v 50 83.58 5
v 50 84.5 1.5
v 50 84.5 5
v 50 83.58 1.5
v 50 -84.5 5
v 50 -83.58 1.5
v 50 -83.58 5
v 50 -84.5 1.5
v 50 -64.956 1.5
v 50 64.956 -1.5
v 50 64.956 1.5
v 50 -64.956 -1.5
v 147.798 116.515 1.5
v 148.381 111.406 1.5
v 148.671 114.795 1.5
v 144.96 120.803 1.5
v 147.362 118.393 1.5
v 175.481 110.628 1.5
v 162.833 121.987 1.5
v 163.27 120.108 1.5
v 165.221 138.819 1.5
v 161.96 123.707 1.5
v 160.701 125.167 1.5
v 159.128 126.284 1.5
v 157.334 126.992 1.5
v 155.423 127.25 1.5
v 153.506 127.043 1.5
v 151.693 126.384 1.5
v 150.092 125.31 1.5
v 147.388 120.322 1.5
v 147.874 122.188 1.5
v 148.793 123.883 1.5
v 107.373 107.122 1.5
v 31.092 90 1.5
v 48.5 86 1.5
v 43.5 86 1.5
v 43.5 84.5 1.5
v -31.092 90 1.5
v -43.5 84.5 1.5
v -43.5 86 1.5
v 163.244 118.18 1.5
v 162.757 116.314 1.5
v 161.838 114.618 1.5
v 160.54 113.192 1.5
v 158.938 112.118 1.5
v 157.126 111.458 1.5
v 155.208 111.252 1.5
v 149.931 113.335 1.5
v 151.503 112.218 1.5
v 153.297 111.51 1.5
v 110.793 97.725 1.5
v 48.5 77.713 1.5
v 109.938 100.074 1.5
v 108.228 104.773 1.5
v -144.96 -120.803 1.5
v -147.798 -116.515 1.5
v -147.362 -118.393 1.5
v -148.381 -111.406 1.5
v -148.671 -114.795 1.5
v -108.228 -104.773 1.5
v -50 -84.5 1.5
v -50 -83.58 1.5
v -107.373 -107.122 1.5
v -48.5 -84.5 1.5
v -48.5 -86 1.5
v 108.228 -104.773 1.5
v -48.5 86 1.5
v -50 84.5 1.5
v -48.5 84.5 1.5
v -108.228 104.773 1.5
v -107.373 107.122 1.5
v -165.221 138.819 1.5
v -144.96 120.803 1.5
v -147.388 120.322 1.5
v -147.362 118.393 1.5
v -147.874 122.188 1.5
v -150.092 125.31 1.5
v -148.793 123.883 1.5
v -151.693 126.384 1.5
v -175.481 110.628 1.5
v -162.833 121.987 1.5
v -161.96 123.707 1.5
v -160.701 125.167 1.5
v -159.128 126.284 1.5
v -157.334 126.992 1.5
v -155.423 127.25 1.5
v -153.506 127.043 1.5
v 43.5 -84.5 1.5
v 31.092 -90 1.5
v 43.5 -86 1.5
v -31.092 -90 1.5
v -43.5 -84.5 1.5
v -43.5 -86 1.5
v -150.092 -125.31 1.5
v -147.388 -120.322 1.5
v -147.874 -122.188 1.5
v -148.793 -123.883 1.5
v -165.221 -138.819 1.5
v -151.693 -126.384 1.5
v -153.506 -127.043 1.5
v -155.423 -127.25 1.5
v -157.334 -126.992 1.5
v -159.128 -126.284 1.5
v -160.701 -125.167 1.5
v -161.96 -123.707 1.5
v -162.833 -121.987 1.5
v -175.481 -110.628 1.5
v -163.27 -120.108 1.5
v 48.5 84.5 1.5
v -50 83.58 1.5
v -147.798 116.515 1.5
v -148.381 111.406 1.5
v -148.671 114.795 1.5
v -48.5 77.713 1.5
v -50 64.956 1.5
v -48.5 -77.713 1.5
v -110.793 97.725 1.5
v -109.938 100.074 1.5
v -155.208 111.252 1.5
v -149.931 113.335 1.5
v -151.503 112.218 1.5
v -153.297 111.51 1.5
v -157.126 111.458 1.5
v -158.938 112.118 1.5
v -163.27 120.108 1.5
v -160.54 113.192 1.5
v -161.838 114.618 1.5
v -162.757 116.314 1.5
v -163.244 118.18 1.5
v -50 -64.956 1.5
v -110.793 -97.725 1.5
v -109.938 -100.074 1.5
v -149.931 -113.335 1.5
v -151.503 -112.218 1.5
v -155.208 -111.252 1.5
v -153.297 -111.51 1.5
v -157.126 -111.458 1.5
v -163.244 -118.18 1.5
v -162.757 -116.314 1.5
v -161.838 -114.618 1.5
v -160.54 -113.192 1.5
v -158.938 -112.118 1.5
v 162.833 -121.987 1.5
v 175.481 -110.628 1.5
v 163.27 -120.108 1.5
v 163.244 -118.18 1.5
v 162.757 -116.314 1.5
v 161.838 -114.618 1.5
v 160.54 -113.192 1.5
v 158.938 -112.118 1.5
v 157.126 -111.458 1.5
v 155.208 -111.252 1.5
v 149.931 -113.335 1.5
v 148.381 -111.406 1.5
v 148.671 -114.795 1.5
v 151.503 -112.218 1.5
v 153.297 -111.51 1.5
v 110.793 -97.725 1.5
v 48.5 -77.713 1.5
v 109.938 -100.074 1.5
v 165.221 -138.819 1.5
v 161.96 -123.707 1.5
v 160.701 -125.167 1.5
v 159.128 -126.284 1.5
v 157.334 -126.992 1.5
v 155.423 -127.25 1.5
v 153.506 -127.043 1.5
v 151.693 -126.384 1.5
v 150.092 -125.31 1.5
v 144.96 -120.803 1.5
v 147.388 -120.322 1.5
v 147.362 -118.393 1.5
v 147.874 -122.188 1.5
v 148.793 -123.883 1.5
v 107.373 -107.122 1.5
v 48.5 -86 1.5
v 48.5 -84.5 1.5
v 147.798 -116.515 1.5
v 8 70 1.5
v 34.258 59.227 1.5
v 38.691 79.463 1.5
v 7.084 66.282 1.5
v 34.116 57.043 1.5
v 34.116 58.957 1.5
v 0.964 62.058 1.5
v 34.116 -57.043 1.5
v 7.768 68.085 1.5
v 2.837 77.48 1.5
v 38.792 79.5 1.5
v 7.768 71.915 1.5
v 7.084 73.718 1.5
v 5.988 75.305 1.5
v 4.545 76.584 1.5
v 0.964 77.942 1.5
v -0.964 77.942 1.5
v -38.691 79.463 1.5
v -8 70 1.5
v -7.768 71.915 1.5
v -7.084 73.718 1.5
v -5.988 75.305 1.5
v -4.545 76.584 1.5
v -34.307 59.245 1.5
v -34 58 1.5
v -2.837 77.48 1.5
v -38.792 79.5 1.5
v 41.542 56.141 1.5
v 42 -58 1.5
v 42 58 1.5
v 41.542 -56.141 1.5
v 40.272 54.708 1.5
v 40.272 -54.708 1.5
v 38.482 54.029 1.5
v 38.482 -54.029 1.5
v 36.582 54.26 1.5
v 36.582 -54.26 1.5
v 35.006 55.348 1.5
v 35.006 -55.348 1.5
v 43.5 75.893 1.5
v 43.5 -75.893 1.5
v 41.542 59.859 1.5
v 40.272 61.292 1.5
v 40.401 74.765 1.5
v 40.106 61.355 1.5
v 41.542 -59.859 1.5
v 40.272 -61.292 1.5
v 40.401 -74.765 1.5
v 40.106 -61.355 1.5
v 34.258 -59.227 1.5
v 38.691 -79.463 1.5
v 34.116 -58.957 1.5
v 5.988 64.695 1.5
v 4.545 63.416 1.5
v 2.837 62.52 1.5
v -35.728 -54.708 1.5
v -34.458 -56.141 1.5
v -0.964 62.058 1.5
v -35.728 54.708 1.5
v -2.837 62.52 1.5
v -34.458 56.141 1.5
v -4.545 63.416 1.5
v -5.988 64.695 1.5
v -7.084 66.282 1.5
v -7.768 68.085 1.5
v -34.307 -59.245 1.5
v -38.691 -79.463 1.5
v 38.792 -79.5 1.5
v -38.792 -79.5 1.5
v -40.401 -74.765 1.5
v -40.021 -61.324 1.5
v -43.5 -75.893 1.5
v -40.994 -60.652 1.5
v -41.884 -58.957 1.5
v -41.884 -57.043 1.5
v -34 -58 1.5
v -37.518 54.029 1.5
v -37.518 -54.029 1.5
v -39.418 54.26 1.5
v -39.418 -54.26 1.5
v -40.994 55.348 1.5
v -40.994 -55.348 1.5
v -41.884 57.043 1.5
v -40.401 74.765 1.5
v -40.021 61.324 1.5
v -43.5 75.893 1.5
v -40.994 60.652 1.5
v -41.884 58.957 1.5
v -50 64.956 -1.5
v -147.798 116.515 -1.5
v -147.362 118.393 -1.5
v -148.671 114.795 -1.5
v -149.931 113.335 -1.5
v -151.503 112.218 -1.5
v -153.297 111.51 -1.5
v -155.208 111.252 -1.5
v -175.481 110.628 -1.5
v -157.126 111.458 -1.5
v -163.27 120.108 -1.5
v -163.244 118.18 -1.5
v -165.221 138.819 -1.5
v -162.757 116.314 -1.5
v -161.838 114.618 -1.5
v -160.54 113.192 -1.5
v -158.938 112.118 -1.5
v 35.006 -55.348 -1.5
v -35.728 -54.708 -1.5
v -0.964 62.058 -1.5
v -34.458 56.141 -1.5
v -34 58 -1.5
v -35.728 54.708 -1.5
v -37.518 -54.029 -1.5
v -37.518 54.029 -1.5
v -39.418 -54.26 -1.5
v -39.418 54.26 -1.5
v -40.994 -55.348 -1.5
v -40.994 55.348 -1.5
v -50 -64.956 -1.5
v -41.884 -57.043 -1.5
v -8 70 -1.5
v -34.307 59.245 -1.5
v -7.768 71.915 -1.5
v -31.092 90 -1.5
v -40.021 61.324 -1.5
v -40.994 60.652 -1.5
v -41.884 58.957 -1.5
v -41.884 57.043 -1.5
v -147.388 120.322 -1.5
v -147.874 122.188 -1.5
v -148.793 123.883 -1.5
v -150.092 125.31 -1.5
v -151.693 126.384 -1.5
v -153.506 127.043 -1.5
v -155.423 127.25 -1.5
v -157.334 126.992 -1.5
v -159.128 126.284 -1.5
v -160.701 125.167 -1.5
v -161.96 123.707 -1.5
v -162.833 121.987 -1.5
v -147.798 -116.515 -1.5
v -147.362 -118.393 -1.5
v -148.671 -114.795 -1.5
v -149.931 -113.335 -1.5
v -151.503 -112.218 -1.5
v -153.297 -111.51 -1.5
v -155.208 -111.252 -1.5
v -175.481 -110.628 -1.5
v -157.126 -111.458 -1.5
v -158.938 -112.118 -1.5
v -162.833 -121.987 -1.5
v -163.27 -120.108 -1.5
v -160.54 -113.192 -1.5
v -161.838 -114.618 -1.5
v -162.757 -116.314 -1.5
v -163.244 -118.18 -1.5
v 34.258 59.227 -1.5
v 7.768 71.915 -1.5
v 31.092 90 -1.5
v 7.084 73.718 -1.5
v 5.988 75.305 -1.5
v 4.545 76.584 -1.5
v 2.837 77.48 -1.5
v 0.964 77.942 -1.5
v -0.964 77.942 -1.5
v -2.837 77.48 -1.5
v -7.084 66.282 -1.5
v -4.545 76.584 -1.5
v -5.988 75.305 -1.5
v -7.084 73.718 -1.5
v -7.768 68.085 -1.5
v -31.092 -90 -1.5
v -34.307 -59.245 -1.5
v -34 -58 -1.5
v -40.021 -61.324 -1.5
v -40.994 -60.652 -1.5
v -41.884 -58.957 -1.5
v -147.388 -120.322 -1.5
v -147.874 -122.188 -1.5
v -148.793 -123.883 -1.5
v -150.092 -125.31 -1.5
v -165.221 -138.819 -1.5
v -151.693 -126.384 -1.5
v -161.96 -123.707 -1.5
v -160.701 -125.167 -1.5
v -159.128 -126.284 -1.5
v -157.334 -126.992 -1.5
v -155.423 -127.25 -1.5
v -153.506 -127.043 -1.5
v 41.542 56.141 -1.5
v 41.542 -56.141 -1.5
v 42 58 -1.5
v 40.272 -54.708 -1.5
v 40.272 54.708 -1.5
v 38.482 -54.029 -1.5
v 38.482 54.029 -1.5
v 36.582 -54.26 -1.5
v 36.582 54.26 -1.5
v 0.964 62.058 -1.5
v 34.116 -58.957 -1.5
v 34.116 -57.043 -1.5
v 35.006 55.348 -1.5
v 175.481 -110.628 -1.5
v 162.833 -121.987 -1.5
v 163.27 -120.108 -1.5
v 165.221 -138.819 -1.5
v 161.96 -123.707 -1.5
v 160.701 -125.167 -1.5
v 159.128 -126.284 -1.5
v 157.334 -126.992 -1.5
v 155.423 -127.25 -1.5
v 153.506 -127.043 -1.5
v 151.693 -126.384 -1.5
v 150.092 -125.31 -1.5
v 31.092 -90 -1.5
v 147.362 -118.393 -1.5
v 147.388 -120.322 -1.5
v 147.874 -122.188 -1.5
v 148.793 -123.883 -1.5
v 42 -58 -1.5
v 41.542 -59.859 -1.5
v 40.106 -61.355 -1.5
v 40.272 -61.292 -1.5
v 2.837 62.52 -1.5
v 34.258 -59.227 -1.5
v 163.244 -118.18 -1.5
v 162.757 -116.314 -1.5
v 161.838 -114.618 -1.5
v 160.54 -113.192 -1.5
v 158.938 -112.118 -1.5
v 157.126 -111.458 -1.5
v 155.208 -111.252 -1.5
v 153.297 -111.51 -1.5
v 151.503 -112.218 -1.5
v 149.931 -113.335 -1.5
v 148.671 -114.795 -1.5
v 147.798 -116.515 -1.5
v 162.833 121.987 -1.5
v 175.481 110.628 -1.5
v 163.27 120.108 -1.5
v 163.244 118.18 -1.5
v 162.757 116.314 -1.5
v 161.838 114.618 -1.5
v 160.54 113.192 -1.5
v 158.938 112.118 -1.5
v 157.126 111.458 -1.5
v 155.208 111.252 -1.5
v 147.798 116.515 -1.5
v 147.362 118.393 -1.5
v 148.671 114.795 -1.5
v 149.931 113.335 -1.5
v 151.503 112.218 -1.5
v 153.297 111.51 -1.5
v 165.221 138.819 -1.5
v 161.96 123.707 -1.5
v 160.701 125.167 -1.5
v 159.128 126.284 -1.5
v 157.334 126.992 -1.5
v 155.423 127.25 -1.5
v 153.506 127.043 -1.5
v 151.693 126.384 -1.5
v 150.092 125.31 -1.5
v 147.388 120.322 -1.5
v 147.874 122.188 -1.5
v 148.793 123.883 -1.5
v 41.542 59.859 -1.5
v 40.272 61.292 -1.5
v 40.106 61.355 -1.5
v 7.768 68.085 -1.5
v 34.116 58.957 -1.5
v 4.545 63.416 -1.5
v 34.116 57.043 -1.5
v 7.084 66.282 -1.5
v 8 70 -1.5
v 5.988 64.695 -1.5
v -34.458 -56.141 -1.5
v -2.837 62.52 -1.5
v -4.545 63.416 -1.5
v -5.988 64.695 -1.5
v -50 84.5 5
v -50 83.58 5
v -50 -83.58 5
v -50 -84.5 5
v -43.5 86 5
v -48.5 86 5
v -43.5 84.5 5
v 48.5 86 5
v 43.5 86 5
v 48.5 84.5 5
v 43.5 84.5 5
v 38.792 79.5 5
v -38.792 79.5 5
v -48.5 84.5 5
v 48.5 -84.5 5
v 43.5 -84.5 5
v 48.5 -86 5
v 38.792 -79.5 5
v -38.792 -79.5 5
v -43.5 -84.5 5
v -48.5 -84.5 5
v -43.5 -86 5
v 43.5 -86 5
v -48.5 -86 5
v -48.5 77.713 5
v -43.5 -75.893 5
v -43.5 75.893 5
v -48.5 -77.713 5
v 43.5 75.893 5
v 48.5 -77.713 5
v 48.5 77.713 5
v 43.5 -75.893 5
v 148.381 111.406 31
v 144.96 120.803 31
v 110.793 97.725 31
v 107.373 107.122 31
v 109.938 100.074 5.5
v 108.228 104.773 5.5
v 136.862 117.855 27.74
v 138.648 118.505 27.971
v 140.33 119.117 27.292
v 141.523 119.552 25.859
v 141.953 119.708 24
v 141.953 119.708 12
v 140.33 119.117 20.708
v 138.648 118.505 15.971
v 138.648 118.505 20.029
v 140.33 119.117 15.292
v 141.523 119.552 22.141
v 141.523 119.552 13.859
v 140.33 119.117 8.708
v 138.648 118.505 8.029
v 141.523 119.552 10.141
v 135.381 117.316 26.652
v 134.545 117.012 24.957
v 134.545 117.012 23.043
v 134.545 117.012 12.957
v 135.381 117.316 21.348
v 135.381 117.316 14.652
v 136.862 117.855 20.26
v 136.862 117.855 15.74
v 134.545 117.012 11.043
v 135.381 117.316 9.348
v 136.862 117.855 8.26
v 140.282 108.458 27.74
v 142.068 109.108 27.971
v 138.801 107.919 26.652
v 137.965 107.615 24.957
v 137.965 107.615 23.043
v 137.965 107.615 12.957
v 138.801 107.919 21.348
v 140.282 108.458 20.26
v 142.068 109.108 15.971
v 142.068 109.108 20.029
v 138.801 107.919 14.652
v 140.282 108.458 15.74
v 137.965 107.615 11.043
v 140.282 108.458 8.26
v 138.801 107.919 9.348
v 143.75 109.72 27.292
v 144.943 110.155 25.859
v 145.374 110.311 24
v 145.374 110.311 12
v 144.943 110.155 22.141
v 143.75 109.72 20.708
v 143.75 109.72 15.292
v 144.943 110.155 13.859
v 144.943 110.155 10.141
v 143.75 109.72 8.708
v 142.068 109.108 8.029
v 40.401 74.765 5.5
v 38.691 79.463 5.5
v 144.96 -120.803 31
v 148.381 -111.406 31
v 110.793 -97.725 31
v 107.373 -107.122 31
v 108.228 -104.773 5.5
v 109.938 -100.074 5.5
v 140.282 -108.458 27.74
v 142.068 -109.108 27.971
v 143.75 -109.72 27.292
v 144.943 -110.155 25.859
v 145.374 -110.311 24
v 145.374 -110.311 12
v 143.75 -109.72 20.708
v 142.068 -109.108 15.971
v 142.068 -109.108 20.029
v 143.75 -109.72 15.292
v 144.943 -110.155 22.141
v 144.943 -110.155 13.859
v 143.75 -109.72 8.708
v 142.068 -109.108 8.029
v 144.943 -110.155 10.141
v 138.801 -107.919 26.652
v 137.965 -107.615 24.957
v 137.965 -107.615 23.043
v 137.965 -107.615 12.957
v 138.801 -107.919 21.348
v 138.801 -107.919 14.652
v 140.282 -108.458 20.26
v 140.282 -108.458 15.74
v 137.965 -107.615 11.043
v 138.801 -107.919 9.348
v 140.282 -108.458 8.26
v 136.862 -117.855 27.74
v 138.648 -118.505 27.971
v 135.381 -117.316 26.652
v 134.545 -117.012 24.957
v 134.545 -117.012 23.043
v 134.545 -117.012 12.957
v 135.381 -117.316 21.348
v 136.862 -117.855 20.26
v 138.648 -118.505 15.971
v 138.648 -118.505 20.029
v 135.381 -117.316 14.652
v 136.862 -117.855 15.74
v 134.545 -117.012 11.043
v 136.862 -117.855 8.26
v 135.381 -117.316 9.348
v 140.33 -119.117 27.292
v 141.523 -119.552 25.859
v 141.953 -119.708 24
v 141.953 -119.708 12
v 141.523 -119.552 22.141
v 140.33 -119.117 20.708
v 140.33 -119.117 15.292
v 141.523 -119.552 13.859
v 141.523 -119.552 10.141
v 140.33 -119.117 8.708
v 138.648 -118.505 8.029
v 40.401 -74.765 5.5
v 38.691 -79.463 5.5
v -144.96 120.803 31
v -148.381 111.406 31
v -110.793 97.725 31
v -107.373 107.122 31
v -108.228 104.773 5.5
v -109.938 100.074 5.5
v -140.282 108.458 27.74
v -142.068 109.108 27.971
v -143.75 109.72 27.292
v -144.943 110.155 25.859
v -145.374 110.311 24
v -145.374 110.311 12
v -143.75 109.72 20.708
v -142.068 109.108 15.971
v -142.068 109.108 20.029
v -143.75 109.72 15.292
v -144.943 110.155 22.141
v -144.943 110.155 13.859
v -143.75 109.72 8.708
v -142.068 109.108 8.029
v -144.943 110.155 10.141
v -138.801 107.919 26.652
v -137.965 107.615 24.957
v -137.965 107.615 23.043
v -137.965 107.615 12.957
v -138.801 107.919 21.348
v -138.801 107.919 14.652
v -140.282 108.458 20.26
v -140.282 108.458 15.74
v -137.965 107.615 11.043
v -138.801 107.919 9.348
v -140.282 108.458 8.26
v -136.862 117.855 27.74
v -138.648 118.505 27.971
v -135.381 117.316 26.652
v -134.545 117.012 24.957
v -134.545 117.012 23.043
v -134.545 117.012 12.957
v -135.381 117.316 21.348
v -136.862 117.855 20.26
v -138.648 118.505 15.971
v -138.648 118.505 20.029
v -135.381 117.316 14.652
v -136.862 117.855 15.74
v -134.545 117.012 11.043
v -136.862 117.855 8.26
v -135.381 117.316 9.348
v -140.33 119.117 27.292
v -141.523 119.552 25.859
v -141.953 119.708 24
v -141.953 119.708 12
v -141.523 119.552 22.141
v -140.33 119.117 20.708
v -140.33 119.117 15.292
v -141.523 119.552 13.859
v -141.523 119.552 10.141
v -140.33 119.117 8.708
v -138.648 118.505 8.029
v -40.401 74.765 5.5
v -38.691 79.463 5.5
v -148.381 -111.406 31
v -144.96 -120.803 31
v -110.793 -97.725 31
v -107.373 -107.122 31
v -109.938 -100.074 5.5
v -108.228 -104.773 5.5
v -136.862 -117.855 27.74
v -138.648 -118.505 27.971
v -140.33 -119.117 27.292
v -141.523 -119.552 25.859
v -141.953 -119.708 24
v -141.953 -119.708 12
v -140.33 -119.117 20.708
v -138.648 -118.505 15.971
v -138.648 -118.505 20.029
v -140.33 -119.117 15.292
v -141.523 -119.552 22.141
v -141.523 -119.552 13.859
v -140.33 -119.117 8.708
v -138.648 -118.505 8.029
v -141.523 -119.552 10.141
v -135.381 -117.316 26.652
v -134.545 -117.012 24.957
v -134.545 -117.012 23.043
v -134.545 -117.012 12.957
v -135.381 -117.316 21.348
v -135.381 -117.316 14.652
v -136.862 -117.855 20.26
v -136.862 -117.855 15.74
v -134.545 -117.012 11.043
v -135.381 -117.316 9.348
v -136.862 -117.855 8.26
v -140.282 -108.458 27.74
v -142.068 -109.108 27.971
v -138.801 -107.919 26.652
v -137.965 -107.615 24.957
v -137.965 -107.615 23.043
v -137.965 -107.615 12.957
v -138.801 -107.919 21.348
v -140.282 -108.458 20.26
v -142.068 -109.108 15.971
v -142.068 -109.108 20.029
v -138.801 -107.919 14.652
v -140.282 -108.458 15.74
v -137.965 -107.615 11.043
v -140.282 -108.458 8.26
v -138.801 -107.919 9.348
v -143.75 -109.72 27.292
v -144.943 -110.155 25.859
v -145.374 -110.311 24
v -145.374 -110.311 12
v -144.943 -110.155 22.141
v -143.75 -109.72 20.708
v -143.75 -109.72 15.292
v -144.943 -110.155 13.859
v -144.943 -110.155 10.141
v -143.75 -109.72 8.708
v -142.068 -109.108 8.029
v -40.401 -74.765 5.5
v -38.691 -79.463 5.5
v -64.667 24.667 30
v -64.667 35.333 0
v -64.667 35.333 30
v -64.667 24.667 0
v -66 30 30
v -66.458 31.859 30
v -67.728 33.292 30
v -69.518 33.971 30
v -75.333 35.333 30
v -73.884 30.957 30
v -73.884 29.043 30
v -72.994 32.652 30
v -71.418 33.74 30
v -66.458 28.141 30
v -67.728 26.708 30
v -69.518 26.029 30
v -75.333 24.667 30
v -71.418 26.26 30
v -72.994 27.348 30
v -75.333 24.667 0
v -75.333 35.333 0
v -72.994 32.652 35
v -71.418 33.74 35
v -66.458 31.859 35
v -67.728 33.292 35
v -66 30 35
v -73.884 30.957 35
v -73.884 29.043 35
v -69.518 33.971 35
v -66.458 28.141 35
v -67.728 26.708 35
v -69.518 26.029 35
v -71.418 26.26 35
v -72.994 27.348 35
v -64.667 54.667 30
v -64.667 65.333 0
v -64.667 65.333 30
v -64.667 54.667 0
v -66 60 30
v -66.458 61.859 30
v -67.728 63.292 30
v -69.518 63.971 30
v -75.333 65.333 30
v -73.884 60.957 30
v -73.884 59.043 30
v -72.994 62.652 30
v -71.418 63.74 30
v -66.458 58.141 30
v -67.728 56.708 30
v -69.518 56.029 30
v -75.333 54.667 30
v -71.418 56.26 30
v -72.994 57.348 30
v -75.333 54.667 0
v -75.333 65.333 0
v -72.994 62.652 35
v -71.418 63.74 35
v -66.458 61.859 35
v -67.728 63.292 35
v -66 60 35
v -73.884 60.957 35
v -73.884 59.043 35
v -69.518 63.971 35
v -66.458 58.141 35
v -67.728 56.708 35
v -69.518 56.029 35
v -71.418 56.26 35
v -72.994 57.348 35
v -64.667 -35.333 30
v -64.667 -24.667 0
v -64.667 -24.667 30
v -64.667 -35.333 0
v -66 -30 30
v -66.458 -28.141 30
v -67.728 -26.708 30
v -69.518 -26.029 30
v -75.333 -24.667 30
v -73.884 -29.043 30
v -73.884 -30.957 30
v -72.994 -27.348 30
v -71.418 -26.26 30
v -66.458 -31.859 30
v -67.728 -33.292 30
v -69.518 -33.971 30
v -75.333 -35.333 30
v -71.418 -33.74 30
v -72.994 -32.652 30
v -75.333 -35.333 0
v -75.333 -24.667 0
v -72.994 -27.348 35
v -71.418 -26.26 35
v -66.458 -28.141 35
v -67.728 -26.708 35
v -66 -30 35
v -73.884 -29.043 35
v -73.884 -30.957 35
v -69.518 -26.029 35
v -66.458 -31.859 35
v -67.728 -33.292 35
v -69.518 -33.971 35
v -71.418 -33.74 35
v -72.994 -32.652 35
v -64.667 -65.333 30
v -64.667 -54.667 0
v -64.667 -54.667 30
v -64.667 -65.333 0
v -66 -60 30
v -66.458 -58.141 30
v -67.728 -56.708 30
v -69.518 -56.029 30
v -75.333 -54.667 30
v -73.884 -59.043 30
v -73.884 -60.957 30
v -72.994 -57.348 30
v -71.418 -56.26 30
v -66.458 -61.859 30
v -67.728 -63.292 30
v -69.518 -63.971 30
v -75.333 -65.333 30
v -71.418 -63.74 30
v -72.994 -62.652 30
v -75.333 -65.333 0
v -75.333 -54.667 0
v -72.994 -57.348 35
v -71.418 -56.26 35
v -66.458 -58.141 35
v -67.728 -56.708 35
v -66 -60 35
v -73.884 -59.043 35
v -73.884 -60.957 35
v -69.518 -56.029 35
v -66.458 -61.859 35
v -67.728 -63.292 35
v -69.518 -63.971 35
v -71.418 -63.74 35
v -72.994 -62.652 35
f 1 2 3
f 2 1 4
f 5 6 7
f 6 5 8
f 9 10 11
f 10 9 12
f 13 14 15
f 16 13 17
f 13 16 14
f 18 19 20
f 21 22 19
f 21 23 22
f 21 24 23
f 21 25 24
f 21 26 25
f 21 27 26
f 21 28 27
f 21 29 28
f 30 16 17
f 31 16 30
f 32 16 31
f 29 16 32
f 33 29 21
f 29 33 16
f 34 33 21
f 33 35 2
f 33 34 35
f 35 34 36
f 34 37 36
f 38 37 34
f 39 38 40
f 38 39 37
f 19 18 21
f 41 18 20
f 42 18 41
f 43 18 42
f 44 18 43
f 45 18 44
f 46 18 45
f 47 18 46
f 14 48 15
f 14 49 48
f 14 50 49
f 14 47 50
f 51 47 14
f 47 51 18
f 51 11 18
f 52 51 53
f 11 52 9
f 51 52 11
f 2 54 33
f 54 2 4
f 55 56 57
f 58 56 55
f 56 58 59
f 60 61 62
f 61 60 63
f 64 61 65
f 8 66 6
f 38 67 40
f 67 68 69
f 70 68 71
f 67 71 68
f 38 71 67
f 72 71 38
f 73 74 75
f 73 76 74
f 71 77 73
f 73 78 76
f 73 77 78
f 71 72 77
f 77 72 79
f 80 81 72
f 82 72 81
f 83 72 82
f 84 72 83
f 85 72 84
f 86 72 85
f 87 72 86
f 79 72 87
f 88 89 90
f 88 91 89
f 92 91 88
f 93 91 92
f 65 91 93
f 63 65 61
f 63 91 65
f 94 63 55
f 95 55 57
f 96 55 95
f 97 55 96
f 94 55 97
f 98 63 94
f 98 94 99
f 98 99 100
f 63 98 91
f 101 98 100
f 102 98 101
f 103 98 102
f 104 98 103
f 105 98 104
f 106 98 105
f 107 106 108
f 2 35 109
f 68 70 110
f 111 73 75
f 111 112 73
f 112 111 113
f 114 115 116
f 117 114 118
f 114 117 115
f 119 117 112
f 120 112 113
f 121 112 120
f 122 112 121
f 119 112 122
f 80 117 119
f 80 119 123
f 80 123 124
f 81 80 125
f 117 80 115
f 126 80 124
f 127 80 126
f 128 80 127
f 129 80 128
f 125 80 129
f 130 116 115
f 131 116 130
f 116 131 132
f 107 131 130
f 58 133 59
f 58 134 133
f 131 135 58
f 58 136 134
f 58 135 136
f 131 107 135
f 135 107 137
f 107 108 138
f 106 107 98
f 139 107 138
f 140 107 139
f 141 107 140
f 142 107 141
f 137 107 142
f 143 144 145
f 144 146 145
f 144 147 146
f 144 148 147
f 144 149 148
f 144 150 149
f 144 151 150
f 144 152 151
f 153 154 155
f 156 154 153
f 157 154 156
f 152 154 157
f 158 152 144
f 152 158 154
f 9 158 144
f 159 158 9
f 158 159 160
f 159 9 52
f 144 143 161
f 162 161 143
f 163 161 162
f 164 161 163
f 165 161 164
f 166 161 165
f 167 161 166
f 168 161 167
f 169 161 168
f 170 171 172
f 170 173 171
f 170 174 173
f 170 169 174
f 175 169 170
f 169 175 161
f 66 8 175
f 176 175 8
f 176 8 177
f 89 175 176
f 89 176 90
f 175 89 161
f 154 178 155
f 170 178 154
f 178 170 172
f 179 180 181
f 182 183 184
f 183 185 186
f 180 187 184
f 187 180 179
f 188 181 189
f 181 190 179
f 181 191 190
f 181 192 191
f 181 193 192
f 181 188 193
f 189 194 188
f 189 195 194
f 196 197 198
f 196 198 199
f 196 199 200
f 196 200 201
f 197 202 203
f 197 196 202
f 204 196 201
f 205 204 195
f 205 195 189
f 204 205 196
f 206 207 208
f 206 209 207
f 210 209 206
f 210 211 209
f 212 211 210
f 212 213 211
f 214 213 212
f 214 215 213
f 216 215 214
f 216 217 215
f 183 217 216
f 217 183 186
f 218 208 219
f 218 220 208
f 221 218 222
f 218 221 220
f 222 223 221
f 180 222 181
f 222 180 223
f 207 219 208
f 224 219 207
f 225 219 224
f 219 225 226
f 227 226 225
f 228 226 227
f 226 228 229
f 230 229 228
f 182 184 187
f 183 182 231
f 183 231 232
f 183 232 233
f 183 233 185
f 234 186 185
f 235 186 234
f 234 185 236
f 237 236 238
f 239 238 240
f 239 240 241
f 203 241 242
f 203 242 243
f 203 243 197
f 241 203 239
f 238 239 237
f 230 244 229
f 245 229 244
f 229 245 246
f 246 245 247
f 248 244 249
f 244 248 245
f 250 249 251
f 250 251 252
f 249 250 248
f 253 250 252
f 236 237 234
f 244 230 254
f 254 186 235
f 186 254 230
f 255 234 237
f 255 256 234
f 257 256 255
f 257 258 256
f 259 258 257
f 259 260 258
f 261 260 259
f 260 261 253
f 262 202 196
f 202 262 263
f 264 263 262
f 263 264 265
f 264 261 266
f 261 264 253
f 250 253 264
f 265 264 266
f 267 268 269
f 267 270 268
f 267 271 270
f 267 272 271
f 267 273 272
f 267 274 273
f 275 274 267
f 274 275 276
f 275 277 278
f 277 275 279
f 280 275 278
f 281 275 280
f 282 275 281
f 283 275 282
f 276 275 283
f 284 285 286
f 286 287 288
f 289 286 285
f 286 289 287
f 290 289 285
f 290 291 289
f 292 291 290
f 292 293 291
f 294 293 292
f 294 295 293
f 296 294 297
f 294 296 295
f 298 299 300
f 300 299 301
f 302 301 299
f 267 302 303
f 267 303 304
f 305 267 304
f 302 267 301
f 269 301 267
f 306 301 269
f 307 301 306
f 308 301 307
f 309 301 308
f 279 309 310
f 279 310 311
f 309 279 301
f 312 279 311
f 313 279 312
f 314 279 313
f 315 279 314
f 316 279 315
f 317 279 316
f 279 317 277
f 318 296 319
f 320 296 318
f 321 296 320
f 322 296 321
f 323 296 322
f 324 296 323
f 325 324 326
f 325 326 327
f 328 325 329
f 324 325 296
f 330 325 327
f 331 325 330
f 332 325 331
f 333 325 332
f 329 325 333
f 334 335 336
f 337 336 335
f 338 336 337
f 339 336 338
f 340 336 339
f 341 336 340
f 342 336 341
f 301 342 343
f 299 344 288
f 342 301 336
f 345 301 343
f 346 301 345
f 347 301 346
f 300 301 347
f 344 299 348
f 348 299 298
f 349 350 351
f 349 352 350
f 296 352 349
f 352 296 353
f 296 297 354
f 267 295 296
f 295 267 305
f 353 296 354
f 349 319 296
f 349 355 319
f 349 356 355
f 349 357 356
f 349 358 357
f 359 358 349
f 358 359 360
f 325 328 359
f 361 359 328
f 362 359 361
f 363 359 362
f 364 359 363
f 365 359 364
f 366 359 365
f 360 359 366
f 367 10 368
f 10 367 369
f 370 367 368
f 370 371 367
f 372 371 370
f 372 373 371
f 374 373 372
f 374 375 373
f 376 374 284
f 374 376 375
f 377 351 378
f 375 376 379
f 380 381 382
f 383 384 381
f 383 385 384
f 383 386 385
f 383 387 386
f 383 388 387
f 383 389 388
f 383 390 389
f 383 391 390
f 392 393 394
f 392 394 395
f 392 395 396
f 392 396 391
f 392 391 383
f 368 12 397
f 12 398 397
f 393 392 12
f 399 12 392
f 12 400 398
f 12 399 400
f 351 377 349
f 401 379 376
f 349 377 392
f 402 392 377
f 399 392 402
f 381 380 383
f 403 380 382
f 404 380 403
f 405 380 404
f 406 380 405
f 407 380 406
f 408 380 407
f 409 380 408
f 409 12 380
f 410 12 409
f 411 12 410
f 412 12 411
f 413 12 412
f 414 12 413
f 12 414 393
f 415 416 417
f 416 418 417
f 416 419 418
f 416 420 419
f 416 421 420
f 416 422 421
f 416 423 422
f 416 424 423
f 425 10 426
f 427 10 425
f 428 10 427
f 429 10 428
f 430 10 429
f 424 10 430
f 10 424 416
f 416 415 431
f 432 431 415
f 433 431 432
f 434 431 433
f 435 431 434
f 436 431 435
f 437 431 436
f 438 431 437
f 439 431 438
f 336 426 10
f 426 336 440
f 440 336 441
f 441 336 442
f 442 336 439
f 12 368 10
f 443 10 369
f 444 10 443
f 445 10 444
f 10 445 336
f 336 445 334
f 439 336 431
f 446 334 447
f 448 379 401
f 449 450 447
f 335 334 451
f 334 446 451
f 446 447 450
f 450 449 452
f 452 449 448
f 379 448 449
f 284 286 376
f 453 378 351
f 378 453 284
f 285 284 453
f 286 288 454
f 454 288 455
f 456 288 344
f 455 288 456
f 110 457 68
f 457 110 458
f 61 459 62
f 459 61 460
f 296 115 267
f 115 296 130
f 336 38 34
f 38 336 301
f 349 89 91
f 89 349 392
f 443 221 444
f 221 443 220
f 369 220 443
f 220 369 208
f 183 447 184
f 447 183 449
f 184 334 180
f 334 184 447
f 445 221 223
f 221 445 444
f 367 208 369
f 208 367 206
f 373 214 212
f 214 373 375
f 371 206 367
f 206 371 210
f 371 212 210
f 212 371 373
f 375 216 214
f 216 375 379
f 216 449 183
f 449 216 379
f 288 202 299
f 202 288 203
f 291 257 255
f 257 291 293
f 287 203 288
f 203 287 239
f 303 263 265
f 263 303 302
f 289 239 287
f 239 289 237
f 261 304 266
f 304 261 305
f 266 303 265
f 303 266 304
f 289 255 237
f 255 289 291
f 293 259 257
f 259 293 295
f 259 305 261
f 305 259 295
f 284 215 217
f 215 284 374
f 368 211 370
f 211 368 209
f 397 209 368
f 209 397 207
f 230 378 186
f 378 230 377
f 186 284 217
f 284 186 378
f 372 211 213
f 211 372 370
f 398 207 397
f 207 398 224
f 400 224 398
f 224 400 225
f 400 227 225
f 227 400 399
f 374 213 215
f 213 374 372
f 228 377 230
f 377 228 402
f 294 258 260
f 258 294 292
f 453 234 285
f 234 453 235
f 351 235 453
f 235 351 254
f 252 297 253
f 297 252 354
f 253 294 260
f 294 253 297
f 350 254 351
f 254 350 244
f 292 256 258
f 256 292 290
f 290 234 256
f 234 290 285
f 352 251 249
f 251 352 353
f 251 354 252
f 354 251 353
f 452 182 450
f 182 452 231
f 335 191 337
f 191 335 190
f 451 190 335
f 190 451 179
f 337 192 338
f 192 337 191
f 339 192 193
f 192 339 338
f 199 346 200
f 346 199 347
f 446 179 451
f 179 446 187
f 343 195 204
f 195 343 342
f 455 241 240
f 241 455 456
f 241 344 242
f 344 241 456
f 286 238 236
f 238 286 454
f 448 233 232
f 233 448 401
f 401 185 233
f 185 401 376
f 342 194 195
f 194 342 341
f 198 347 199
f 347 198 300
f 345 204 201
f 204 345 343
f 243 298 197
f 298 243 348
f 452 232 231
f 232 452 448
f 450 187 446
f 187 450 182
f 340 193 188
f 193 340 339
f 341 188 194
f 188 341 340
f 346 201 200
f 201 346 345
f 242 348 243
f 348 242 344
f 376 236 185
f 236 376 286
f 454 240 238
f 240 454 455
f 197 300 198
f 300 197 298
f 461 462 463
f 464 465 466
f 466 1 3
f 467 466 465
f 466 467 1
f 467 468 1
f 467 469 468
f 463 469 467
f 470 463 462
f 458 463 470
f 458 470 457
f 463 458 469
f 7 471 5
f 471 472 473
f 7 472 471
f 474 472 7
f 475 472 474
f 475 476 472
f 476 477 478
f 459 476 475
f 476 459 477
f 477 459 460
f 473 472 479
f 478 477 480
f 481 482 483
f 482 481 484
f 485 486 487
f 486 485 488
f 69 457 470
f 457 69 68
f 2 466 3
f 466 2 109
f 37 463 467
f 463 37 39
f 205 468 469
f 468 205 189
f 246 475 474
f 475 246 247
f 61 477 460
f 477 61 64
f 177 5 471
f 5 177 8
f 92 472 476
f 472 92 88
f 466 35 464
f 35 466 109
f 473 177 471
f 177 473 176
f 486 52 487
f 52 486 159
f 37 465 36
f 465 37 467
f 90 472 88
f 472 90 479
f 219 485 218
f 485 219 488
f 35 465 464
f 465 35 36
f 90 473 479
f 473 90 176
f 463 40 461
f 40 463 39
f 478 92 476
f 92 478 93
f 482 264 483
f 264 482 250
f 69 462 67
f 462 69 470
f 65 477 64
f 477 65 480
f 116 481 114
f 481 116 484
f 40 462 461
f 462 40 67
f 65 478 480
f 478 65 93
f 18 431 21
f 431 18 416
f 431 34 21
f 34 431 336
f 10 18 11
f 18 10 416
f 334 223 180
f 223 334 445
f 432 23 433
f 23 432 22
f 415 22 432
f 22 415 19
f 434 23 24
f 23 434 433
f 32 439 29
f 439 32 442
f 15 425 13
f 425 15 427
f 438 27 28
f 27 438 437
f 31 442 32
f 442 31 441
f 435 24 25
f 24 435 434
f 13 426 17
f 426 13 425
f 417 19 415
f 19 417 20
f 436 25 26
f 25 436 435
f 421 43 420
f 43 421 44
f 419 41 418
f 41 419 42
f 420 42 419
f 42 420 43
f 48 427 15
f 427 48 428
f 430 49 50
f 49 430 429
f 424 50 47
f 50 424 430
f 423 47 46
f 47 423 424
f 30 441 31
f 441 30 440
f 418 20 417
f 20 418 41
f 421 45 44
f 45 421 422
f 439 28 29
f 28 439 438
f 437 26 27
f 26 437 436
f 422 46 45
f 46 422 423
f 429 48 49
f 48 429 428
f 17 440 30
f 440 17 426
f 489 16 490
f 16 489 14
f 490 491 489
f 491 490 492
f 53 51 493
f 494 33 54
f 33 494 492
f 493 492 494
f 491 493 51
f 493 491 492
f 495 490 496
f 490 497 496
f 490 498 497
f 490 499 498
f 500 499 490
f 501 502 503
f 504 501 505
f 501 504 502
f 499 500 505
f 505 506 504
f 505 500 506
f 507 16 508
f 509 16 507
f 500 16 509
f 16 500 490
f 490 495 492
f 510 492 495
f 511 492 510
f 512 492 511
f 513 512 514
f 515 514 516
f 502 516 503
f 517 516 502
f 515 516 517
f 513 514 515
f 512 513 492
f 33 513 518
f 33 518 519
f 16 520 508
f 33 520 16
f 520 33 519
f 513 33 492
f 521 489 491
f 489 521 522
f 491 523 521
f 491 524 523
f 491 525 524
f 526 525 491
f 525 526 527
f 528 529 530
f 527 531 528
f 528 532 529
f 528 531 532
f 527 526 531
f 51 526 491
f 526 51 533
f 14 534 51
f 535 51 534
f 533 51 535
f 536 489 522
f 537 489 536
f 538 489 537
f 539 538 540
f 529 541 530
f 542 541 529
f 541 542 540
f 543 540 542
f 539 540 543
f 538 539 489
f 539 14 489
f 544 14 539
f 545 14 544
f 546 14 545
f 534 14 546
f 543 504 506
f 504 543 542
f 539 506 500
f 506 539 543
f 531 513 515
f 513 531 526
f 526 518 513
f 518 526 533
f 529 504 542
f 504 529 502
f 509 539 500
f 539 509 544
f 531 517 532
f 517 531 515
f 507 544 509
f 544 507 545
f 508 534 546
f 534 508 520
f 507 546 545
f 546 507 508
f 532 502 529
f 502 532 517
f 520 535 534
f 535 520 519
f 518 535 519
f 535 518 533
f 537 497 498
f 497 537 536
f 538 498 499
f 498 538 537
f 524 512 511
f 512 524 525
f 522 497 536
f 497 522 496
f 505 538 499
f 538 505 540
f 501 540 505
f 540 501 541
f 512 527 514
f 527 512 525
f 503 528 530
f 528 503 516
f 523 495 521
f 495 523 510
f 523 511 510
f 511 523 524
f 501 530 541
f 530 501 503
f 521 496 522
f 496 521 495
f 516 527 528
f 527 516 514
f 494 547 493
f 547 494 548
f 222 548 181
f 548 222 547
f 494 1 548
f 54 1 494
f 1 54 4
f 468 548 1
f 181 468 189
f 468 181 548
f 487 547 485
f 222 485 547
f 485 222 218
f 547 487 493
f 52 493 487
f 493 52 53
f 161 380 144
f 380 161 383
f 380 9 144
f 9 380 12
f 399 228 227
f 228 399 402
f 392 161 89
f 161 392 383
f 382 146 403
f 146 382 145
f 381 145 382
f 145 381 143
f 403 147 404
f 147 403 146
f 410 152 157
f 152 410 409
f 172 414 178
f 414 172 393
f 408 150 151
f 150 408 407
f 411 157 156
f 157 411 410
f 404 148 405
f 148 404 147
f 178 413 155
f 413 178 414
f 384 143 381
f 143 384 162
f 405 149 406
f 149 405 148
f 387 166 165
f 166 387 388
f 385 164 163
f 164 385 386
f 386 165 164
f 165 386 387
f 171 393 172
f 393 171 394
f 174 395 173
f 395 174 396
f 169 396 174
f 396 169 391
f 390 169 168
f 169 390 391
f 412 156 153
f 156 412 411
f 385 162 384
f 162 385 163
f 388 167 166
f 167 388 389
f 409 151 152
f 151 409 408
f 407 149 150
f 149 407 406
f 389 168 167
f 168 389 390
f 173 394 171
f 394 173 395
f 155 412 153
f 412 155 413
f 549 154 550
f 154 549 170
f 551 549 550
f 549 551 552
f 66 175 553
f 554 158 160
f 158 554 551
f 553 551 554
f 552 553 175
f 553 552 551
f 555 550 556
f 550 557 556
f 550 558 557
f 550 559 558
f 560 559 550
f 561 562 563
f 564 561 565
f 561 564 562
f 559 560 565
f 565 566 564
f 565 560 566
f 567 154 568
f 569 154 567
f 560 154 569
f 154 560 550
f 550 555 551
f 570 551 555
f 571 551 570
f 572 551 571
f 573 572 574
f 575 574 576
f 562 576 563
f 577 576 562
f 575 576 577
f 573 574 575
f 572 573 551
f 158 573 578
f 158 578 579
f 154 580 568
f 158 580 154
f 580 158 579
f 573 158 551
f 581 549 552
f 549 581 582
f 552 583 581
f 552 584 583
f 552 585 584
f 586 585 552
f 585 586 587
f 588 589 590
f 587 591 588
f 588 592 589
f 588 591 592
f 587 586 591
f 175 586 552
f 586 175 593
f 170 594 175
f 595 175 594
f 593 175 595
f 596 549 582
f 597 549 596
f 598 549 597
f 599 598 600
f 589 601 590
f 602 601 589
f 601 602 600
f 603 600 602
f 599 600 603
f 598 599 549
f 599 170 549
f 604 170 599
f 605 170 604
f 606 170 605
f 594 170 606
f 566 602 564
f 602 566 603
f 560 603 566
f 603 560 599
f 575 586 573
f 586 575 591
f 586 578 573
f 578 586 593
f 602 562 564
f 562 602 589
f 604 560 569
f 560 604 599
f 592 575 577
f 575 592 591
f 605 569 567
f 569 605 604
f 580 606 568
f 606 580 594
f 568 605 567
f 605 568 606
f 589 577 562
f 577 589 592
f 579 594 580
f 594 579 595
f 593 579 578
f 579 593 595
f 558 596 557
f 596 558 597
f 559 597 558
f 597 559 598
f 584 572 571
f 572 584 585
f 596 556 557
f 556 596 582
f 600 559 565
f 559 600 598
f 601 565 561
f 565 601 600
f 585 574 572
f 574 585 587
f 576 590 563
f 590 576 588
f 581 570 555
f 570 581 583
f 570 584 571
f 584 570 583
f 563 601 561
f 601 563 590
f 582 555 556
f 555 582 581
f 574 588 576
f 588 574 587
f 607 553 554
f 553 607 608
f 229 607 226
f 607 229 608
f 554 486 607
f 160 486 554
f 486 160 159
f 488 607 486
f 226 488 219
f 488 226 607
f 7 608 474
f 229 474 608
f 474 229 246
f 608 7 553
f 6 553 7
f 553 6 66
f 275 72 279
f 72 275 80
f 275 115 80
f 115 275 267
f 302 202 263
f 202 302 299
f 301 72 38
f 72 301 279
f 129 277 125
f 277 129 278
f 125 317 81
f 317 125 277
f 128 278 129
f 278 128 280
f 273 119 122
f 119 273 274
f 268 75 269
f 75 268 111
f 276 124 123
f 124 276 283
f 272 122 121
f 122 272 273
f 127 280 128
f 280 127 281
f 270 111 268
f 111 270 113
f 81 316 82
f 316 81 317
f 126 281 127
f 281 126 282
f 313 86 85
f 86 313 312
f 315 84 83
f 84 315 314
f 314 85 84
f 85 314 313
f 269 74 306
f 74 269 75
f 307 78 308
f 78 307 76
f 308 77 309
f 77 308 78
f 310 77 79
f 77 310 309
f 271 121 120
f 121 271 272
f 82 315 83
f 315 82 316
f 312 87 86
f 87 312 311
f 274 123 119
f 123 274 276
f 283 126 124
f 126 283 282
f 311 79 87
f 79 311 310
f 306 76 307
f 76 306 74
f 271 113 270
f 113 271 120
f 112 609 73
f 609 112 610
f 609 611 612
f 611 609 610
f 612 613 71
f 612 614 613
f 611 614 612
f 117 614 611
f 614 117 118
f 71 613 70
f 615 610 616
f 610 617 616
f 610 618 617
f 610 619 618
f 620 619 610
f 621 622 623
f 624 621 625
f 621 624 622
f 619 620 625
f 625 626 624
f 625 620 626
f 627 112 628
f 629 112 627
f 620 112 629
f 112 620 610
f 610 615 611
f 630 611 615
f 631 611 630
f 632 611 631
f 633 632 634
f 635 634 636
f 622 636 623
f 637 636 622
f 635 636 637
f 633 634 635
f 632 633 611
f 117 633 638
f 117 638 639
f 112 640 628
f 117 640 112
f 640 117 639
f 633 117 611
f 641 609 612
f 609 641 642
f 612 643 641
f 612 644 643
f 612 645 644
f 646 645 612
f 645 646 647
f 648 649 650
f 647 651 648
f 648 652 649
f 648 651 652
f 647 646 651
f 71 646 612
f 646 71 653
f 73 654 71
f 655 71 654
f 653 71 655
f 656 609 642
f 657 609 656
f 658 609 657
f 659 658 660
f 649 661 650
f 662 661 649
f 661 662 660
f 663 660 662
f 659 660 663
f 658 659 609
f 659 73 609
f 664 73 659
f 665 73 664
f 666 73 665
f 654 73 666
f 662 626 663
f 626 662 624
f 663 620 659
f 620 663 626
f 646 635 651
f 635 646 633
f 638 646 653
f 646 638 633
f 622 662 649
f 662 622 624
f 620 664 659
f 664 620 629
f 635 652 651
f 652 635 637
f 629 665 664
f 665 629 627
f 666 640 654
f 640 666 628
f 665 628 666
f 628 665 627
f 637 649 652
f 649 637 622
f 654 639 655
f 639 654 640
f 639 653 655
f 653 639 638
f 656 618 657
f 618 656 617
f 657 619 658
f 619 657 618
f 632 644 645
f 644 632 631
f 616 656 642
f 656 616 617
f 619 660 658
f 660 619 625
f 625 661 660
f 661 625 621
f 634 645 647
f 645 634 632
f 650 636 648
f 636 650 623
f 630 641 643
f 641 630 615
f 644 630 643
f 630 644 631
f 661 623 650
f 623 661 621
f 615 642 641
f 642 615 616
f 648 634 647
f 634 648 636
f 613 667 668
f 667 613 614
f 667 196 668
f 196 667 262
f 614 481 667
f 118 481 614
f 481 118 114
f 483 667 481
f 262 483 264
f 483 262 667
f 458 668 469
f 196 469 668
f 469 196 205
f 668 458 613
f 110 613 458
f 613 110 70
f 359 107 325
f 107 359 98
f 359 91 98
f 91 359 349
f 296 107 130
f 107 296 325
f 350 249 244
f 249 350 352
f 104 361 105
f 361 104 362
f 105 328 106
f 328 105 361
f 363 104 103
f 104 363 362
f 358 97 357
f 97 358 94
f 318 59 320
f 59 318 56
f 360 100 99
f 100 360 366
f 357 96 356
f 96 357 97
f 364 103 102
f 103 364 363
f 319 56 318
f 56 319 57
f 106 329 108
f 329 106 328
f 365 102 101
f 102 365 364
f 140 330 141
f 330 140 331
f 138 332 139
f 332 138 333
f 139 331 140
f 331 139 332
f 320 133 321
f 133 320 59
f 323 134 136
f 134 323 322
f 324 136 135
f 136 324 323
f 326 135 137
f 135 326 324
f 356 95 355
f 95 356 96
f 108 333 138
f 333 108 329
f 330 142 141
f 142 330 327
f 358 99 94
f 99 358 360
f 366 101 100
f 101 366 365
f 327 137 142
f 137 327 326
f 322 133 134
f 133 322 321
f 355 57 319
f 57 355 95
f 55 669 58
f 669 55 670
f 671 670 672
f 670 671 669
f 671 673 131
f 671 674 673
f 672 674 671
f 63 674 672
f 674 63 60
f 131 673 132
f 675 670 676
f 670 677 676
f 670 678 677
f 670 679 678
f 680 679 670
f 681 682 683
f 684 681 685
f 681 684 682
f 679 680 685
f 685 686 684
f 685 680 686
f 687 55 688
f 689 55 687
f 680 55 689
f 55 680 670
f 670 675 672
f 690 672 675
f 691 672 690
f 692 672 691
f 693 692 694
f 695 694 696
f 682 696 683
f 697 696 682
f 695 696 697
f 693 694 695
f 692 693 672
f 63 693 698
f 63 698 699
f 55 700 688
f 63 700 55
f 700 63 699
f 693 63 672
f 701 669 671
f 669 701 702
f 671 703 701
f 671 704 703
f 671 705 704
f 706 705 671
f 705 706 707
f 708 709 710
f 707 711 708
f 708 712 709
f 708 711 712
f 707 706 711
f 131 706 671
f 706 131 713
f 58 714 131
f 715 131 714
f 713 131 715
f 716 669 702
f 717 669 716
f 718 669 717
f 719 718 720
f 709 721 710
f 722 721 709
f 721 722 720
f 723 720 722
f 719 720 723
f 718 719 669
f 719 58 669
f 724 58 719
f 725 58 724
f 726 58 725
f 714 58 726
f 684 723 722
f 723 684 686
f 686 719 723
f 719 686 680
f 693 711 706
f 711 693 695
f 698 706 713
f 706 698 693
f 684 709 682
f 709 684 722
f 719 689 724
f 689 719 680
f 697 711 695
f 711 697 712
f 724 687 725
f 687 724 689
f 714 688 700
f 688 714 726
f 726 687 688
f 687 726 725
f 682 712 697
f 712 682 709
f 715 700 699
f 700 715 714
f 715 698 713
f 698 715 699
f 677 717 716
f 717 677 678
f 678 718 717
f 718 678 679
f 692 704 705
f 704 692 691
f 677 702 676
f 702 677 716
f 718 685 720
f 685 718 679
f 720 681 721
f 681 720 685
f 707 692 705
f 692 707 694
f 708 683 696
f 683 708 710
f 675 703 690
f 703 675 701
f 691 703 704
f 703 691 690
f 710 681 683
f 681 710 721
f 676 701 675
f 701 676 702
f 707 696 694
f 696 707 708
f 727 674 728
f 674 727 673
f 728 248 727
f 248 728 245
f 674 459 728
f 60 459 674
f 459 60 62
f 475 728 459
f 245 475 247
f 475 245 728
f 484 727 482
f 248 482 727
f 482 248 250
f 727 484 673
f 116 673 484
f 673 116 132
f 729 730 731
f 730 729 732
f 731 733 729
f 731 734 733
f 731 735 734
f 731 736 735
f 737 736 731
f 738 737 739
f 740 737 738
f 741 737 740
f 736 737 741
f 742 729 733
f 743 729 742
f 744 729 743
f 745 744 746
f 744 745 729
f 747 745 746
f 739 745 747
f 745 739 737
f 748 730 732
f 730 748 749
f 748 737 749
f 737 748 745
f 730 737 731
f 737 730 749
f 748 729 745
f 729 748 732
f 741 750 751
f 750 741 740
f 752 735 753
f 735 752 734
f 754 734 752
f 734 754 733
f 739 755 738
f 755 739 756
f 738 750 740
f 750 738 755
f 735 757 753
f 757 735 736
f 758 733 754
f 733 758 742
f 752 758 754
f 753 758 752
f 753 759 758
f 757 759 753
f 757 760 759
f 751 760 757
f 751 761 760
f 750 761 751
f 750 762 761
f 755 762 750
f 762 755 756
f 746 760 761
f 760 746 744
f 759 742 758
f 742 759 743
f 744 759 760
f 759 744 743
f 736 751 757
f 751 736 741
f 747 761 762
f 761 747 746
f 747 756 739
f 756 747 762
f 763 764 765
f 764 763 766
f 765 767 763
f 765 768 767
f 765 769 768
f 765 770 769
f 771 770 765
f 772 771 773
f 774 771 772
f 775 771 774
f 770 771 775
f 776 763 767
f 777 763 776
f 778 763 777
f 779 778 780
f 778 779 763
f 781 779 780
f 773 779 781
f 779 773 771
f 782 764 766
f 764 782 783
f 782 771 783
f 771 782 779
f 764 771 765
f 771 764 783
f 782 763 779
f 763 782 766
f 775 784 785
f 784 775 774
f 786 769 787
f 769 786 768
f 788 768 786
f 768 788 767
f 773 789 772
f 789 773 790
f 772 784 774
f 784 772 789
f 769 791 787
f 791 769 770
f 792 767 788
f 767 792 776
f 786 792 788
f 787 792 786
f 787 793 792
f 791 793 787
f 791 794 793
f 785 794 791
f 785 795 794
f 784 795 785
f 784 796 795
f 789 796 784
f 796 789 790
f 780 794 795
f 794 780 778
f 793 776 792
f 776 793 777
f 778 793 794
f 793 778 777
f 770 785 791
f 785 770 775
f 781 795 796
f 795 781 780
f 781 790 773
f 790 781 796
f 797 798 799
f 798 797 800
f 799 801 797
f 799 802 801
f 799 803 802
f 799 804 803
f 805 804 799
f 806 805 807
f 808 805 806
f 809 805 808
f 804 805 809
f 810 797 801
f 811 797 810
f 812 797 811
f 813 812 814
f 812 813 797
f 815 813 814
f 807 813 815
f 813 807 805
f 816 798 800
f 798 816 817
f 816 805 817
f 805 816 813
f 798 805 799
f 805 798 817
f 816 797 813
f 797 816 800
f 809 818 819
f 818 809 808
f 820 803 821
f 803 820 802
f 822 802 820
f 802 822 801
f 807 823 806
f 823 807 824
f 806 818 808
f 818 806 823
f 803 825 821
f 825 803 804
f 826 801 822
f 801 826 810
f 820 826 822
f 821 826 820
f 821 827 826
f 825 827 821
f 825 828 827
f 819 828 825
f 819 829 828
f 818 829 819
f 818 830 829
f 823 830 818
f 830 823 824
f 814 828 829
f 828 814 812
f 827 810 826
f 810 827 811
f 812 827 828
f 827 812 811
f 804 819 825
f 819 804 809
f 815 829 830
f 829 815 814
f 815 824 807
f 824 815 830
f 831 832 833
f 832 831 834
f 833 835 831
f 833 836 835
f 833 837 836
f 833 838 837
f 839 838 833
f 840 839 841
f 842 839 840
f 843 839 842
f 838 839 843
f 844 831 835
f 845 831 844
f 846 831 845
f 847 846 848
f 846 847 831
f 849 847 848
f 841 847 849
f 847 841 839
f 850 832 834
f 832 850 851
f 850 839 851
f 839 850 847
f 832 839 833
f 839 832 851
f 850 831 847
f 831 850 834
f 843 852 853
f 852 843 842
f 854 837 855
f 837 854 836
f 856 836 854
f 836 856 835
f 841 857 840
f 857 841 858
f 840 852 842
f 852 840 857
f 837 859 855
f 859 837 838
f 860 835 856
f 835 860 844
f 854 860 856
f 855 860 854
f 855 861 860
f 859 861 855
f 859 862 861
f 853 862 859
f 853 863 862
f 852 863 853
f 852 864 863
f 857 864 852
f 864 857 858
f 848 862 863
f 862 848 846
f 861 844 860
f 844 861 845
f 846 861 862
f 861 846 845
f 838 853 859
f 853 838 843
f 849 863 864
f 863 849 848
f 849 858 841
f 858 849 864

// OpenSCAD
// Globals

motorDiameter = 16;
motorLength   = 40;

baseLength    = 180;
baseWidth     = 100;
baseThick     = 3;
ridgeThick    = 5;

droneColor    = [0, .75, 0, 1]; // Green
    
armLength     = 160;
armWidth      = 30;
armXOffset    = 20;
armYOffset    = 70;
armAngle      = 20;
armRidgeShort = 44;

legHeight     = 30;
// Run

main();

// Code

module main() {
    union() {
        color(droneColor) {

            base();
            // Arms
            arm(armLength, armWidth, armXOffset, armYOffset, armAngle);
            arm(armLength, armWidth, armXOffset, -armYOffset, -armAngle);
            arm(armLength, armWidth, -armXOffset, armYOffset, 180 - armAngle);
            arm(armLength, armWidth, -armXOffset, -armYOffset, 180 + armAngle);

            leg(legHeight, baseWidth/2 - 120, baseLength/6);
            leg(legHeight, baseWidth/2 - 120, baseLength/3);
            leg(legHeight, baseWidth/2 - 120, -baseLength/6);
            leg(legHeight, baseWidth/2 - 120, -baseLength/3);

        }    
    }
}

module base() 
{
    
//    arm(armLength, armWidth, 0, 0, 0);
/**/
    union(){
        difference() {
            // Base
            cube(
                [baseWidth, baseLength, baseThick],
                center = true
            );

            // Leg hole
            translate([baseWidth/2 - 12, baseLength/2  - motorDiameter - 16, 0]){
                cylinder(motorLength, motorDiameter/4, motorDiameter/4, center = true);
            };

            // Leg hole
            translate([-baseWidth/2 + 12, baseLength/2 - motorDiameter - 16, 0]){
                cylinder(motorLength, motorDiameter/4, motorDiameter/4, center = true);
            };

            // Leg hole
            translate([baseWidth/2 - 12, -baseLength/2  + motorDiameter + 16, 0]){
                cylinder(motorLength, motorDiameter/4, motorDiameter/4, center = true);
            };
            
            // Leg hole
            translate([-baseWidth/2 + 12, -baseLength/2  + motorDiameter + 16, 0]){
                cylinder(motorLength, motorDiameter/4, motorDiameter/4, center = true);
            };
            
            // Cable Hole
            translate([0, baseLength/2 - 20, 0]){
                cylinder(motorLength, motorDiameter/2, motorDiameter/2, center = true);
            };

        }
        
        // Stiffeners 
        translate([0, baseLength/2 - 8, ridgeThick/2]) {
            cube([baseWidth, ridgeThick, ridgeThick], center = true);
        }
        translate([0, -baseLength/2 + 8, ridgeThick/2]) {
            cube([baseWidth, ridgeThick, ridgeThick], center = true);
        }

        translate([baseWidth/2-4, 0, ridgeThick/2]) {
            cube([ridgeThick, baseLength - 8, ridgeThick], center = true);
        }
        translate([-baseWidth/2+4, 0, ridgeThick/2]) {
            cube([ridgeThick, baseLength - 8, ridgeThick], center = true);
        }
            
    
    }
/**/
}

module leg(height, x, y) 
{
    translate([x, y, height/2]) {
        union() {
            cube([motorDiameter/1.5, motorDiameter/1.5, height], center = true);
            translate([0, 0, height - ridgeThick*3]) {
                cylinder(ridgeThick*2, motorDiameter/4, motorDiameter/4, center = true);
            }
        }
    }
}

module arm(len, wid, x, y, deg) 
{
    union() {
        translate([cos(deg)*len/2 + x, sin(deg)*len/2 + y, 0]) {
            rotate(deg) {
                union() {
                    
                    // Plate with hole
                    difference() {
                        cube(
                            [len, wid, baseThick],
                            center = true
                        );
                        translate([len/2 - motorDiameter, 0, 0]){
                            cylinder(motorLength, motorDiameter/2, motorDiameter/2, center = true);
                        };
                    }

                    
                    translate([-1.2*motorDiameter+2, 0, baseThick]) {
                        union() {
                            // Motor Support
                            translate([(len-motorDiameter)/2 - motorLength/2, 0, (motorLength*.75)/2-2]) {
                                difference() {
                                    cube ([motorLength, ridgeThick*2, motorLength*.75], center = true);
                                    translate([motorLength-motorDiameter*1.7, 0, -motorLength*.1]){
                                        rotate([90,0,0]) {
                                            cylinder(50, motorDiameter/4, motorDiameter/4, center = true);
                                        }
                                    };
                                    translate([motorLength-motorDiameter*1.7, 0, motorLength*.2]){
                                        rotate([90,0,0]) {
                                            cylinder(50, motorDiameter/4, motorDiameter/4, center = true);
                                        }
                                    };
                                    
                                }
                            }
                            // Plate Stiffner
                            cube ([len-motorDiameter*2 - armRidgeShort, ridgeThick, ridgeThick], center = true);
                        }
                    }

                }
            }
        }
    }
    
}
